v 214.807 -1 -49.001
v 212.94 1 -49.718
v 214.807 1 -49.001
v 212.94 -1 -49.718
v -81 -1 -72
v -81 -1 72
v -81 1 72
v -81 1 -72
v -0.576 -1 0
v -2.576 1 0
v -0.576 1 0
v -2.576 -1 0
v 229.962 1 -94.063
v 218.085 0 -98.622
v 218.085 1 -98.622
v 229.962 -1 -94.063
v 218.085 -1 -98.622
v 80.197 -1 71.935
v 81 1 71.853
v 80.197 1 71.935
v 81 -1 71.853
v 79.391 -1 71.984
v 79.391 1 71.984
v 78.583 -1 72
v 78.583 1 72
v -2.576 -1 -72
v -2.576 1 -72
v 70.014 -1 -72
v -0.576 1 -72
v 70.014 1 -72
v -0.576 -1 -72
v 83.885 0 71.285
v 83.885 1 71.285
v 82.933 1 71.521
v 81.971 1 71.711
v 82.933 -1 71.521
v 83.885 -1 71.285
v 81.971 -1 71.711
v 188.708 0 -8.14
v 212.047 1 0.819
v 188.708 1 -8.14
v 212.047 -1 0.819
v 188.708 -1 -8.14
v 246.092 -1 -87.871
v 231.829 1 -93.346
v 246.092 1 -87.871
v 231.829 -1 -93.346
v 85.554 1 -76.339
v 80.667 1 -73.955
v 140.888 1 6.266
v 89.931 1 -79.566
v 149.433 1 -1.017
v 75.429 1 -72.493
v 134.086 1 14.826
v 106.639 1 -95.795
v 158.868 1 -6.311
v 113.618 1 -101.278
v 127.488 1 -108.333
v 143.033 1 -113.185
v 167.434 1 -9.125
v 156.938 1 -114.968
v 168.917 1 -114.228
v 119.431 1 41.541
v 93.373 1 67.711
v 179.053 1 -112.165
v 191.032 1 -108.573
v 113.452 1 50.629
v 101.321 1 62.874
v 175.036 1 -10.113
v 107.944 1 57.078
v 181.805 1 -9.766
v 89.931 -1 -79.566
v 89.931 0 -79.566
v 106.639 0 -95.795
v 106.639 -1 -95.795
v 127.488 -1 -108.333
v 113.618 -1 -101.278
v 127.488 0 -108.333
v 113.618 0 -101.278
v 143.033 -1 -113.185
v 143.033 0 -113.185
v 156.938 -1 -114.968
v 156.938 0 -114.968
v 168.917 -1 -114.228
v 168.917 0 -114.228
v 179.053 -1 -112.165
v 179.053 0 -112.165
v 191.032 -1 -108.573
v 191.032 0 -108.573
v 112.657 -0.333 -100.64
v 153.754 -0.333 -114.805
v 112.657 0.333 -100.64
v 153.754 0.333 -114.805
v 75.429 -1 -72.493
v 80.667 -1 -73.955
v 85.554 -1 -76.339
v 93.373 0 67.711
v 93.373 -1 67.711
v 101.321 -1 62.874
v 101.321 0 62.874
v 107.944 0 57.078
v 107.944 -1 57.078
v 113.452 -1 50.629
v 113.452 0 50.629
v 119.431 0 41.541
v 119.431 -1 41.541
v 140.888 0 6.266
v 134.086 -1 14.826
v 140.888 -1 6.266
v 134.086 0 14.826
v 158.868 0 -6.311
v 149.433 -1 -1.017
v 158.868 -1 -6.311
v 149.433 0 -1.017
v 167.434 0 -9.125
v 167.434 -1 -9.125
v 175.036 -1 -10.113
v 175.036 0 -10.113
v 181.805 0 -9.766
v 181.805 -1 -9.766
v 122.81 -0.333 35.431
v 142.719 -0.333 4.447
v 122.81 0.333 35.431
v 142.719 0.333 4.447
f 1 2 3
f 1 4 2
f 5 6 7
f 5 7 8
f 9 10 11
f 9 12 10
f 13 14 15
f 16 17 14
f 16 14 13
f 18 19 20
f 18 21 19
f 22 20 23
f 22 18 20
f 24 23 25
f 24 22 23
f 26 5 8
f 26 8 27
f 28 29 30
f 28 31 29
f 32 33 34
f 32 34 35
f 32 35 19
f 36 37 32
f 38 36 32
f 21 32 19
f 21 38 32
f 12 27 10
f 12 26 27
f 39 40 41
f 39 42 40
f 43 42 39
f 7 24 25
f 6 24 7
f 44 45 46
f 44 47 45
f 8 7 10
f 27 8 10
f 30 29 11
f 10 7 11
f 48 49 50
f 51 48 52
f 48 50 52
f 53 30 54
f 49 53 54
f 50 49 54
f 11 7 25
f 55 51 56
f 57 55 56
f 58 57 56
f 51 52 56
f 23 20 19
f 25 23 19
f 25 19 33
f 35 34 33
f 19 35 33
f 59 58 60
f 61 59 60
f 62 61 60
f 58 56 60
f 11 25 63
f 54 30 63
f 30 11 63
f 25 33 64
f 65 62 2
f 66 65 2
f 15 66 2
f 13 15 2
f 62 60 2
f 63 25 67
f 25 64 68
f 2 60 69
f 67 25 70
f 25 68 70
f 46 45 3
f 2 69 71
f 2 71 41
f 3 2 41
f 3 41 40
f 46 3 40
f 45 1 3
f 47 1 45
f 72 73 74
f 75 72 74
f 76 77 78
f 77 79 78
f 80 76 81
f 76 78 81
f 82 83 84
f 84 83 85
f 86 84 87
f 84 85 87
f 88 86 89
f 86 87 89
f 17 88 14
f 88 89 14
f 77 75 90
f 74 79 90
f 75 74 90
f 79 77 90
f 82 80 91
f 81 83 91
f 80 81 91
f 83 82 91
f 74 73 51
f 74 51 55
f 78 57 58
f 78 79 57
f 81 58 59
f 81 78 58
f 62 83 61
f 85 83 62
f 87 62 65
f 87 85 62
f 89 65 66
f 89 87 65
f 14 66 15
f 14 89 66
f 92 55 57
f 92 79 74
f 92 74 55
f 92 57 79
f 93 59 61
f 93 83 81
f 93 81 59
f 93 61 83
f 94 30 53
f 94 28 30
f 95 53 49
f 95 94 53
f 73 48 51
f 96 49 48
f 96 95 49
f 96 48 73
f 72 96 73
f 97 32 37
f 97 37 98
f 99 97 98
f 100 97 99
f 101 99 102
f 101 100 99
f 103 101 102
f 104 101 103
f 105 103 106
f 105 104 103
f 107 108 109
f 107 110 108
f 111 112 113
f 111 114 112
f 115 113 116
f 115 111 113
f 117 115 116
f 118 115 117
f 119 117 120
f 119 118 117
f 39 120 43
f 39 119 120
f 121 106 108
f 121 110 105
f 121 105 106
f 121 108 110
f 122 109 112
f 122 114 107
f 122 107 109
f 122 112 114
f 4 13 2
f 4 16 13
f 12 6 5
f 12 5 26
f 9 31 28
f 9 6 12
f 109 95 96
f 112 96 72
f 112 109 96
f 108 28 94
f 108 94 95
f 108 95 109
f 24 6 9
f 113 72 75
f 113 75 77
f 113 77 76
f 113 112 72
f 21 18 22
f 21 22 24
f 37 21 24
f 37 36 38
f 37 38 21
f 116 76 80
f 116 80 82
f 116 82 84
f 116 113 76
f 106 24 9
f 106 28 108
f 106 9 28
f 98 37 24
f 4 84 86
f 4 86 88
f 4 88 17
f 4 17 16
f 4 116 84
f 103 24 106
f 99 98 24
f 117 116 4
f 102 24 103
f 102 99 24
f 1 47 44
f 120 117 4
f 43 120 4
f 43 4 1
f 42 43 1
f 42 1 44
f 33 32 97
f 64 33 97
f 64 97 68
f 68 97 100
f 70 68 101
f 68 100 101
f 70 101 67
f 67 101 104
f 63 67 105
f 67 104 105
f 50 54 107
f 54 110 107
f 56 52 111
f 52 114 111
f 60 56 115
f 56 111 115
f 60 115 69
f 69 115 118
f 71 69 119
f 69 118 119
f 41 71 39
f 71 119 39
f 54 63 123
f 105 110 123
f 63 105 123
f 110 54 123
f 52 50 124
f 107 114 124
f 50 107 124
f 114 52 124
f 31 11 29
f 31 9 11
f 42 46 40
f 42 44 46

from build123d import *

# Parameters (mm, degrees)
F1_DEPTH = 1


with BuildPart() as f1:
    # F0 (on Front) → F1 (new body, symmetric)
    with BuildSketch(Plane.XZ):
        with BuildLine():
            Line((78.5832557587, 72), (-81, 72))
            Line((-81, 72), (-81, -72))
            Line((-81, -72), (-2.5758354459, -72))
            Line((-2.5758354459, -72), (-2.5758354459, 0))
            Line((-2.5758354459, 0), (-0.5758354459, 0))
            Line((-0.5758354459, 0), (-0.5758354459, -72))
            Line((-0.5758354459, -72), (70.0140722752, -72))
            ThreePointArc((70.0140722752, -72), (80.6669131732, -73.9550899306), (89.9312699398, -79.5655346133))
            add(Edge.make_bspline(
                [(81, -72), (84.4635983749, -74.8141629135), (87.3994420895, -77.31779147), (89.9312699398, -79.5655346133)],
                knots=[0, 0, 0, 0, 0.0519635784, 0.0519635784, 0.0519635784, 0.0519635784], degree=3))
            Line((81, -72), (81, 71.8534467353))
            ThreePointArc((81, 71.8534467353), (79.7938476168, 71.9633280631), (78.5832557587, 72))
        make_face()
        with BuildLine():
            Line((81, 72), (81, 71.8534467353))
            Line((81, 71.8534467353), (81, -72))
            add(Edge.make_bspline(
                [(81, -72), (84.4635983749, -74.8141629135), (87.3994420895, -77.31779147), (89.9312699398, -79.5655346133)],
                knots=[0, 0, 0, 0, 0.0519635784, 0.0519635784, 0.0519635784, 0.0519635784], degree=3))
            add(Edge.make_bspline(
                [(89.9312699398, -79.5655346133), (102.3651827748, -90.6042955291), (108.3217609729, -101.383114475), (158.7265599507, -121.9444495797), (190.0937696642, -109.2006741806), (218.0848423474, -98.6219057368)],
                knots=[0.0519635784, 0.0519635784, 0.0519635784, 0.0519635784, 0.3071588928, 0.6171111846, 1, 1, 1, 1], degree=3))
            Line((218.0848423474, -98.6219057368), (229.9621609222, -94.0626303033))
            Line((229.9621609222, -94.0626303033), (212.9396833188, -49.7175600446))
            Line((212.9396833188, -49.7175600446), (214.8068441718, -49.0008241456))
            Line((214.8068441718, -49.0008241456), (231.8293217752, -93.3458944042))
            Line((231.8293217752, -93.3458944042), (246.0922551423, -87.8708672505))
            Line((246.0922551423, -87.8708672505), (212.0472999355, 0.8192732668))
            Line((212.0472999355, 0.8192732668), (188.707789273, -8.1399254719))
            add(Edge.make_bspline(
                [(83.8849046159, 71.2845150158), (105.3400246798, 65.3861290478), (124.0549392531, 35.6814961762), (138.1532322102, 1.7025226497), (170.7937318796, -14.1268512491), (188.707789273, -8.1399254719)],
                knots=[0.0153089318, 0.0153089318, 0.0153089318, 0.0153089318, 0.3648606153, 0.6619581151, 1, 1, 1, 1], degree=3))
            add(Edge.make_bspline(
                [(81, 72), (81.9838635002, 71.7816800805), (82.9452582497, 71.542840158), (83.8849046159, 71.2845150158)],
                knots=[0, 0, 0, 0, 0.0153089318, 0.0153089318, 0.0153089318, 0.0153089318], degree=3))
        make_face()
        with BuildLine():
            ThreePointArc((83.8849046159, 71.2845150158), (82.45292226, 71.6220712762), (81, 71.8534467353))
            Line((81, 71.8534467353), (81, 72))
            add(Edge.make_bspline(
                [(81, 72), (81.9838635002, 71.7816800805), (82.9452582497, 71.542840158), (83.8849046159, 71.2845150158)],
                knots=[0, 0, 0, 0, 0.0153089318, 0.0153089318, 0.0153089318, 0.0153089318], degree=3))
        make_face(mode=Mode.SUBTRACT)
    extrude(amount=F1_DEPTH, both=True)


solid = f1.part
